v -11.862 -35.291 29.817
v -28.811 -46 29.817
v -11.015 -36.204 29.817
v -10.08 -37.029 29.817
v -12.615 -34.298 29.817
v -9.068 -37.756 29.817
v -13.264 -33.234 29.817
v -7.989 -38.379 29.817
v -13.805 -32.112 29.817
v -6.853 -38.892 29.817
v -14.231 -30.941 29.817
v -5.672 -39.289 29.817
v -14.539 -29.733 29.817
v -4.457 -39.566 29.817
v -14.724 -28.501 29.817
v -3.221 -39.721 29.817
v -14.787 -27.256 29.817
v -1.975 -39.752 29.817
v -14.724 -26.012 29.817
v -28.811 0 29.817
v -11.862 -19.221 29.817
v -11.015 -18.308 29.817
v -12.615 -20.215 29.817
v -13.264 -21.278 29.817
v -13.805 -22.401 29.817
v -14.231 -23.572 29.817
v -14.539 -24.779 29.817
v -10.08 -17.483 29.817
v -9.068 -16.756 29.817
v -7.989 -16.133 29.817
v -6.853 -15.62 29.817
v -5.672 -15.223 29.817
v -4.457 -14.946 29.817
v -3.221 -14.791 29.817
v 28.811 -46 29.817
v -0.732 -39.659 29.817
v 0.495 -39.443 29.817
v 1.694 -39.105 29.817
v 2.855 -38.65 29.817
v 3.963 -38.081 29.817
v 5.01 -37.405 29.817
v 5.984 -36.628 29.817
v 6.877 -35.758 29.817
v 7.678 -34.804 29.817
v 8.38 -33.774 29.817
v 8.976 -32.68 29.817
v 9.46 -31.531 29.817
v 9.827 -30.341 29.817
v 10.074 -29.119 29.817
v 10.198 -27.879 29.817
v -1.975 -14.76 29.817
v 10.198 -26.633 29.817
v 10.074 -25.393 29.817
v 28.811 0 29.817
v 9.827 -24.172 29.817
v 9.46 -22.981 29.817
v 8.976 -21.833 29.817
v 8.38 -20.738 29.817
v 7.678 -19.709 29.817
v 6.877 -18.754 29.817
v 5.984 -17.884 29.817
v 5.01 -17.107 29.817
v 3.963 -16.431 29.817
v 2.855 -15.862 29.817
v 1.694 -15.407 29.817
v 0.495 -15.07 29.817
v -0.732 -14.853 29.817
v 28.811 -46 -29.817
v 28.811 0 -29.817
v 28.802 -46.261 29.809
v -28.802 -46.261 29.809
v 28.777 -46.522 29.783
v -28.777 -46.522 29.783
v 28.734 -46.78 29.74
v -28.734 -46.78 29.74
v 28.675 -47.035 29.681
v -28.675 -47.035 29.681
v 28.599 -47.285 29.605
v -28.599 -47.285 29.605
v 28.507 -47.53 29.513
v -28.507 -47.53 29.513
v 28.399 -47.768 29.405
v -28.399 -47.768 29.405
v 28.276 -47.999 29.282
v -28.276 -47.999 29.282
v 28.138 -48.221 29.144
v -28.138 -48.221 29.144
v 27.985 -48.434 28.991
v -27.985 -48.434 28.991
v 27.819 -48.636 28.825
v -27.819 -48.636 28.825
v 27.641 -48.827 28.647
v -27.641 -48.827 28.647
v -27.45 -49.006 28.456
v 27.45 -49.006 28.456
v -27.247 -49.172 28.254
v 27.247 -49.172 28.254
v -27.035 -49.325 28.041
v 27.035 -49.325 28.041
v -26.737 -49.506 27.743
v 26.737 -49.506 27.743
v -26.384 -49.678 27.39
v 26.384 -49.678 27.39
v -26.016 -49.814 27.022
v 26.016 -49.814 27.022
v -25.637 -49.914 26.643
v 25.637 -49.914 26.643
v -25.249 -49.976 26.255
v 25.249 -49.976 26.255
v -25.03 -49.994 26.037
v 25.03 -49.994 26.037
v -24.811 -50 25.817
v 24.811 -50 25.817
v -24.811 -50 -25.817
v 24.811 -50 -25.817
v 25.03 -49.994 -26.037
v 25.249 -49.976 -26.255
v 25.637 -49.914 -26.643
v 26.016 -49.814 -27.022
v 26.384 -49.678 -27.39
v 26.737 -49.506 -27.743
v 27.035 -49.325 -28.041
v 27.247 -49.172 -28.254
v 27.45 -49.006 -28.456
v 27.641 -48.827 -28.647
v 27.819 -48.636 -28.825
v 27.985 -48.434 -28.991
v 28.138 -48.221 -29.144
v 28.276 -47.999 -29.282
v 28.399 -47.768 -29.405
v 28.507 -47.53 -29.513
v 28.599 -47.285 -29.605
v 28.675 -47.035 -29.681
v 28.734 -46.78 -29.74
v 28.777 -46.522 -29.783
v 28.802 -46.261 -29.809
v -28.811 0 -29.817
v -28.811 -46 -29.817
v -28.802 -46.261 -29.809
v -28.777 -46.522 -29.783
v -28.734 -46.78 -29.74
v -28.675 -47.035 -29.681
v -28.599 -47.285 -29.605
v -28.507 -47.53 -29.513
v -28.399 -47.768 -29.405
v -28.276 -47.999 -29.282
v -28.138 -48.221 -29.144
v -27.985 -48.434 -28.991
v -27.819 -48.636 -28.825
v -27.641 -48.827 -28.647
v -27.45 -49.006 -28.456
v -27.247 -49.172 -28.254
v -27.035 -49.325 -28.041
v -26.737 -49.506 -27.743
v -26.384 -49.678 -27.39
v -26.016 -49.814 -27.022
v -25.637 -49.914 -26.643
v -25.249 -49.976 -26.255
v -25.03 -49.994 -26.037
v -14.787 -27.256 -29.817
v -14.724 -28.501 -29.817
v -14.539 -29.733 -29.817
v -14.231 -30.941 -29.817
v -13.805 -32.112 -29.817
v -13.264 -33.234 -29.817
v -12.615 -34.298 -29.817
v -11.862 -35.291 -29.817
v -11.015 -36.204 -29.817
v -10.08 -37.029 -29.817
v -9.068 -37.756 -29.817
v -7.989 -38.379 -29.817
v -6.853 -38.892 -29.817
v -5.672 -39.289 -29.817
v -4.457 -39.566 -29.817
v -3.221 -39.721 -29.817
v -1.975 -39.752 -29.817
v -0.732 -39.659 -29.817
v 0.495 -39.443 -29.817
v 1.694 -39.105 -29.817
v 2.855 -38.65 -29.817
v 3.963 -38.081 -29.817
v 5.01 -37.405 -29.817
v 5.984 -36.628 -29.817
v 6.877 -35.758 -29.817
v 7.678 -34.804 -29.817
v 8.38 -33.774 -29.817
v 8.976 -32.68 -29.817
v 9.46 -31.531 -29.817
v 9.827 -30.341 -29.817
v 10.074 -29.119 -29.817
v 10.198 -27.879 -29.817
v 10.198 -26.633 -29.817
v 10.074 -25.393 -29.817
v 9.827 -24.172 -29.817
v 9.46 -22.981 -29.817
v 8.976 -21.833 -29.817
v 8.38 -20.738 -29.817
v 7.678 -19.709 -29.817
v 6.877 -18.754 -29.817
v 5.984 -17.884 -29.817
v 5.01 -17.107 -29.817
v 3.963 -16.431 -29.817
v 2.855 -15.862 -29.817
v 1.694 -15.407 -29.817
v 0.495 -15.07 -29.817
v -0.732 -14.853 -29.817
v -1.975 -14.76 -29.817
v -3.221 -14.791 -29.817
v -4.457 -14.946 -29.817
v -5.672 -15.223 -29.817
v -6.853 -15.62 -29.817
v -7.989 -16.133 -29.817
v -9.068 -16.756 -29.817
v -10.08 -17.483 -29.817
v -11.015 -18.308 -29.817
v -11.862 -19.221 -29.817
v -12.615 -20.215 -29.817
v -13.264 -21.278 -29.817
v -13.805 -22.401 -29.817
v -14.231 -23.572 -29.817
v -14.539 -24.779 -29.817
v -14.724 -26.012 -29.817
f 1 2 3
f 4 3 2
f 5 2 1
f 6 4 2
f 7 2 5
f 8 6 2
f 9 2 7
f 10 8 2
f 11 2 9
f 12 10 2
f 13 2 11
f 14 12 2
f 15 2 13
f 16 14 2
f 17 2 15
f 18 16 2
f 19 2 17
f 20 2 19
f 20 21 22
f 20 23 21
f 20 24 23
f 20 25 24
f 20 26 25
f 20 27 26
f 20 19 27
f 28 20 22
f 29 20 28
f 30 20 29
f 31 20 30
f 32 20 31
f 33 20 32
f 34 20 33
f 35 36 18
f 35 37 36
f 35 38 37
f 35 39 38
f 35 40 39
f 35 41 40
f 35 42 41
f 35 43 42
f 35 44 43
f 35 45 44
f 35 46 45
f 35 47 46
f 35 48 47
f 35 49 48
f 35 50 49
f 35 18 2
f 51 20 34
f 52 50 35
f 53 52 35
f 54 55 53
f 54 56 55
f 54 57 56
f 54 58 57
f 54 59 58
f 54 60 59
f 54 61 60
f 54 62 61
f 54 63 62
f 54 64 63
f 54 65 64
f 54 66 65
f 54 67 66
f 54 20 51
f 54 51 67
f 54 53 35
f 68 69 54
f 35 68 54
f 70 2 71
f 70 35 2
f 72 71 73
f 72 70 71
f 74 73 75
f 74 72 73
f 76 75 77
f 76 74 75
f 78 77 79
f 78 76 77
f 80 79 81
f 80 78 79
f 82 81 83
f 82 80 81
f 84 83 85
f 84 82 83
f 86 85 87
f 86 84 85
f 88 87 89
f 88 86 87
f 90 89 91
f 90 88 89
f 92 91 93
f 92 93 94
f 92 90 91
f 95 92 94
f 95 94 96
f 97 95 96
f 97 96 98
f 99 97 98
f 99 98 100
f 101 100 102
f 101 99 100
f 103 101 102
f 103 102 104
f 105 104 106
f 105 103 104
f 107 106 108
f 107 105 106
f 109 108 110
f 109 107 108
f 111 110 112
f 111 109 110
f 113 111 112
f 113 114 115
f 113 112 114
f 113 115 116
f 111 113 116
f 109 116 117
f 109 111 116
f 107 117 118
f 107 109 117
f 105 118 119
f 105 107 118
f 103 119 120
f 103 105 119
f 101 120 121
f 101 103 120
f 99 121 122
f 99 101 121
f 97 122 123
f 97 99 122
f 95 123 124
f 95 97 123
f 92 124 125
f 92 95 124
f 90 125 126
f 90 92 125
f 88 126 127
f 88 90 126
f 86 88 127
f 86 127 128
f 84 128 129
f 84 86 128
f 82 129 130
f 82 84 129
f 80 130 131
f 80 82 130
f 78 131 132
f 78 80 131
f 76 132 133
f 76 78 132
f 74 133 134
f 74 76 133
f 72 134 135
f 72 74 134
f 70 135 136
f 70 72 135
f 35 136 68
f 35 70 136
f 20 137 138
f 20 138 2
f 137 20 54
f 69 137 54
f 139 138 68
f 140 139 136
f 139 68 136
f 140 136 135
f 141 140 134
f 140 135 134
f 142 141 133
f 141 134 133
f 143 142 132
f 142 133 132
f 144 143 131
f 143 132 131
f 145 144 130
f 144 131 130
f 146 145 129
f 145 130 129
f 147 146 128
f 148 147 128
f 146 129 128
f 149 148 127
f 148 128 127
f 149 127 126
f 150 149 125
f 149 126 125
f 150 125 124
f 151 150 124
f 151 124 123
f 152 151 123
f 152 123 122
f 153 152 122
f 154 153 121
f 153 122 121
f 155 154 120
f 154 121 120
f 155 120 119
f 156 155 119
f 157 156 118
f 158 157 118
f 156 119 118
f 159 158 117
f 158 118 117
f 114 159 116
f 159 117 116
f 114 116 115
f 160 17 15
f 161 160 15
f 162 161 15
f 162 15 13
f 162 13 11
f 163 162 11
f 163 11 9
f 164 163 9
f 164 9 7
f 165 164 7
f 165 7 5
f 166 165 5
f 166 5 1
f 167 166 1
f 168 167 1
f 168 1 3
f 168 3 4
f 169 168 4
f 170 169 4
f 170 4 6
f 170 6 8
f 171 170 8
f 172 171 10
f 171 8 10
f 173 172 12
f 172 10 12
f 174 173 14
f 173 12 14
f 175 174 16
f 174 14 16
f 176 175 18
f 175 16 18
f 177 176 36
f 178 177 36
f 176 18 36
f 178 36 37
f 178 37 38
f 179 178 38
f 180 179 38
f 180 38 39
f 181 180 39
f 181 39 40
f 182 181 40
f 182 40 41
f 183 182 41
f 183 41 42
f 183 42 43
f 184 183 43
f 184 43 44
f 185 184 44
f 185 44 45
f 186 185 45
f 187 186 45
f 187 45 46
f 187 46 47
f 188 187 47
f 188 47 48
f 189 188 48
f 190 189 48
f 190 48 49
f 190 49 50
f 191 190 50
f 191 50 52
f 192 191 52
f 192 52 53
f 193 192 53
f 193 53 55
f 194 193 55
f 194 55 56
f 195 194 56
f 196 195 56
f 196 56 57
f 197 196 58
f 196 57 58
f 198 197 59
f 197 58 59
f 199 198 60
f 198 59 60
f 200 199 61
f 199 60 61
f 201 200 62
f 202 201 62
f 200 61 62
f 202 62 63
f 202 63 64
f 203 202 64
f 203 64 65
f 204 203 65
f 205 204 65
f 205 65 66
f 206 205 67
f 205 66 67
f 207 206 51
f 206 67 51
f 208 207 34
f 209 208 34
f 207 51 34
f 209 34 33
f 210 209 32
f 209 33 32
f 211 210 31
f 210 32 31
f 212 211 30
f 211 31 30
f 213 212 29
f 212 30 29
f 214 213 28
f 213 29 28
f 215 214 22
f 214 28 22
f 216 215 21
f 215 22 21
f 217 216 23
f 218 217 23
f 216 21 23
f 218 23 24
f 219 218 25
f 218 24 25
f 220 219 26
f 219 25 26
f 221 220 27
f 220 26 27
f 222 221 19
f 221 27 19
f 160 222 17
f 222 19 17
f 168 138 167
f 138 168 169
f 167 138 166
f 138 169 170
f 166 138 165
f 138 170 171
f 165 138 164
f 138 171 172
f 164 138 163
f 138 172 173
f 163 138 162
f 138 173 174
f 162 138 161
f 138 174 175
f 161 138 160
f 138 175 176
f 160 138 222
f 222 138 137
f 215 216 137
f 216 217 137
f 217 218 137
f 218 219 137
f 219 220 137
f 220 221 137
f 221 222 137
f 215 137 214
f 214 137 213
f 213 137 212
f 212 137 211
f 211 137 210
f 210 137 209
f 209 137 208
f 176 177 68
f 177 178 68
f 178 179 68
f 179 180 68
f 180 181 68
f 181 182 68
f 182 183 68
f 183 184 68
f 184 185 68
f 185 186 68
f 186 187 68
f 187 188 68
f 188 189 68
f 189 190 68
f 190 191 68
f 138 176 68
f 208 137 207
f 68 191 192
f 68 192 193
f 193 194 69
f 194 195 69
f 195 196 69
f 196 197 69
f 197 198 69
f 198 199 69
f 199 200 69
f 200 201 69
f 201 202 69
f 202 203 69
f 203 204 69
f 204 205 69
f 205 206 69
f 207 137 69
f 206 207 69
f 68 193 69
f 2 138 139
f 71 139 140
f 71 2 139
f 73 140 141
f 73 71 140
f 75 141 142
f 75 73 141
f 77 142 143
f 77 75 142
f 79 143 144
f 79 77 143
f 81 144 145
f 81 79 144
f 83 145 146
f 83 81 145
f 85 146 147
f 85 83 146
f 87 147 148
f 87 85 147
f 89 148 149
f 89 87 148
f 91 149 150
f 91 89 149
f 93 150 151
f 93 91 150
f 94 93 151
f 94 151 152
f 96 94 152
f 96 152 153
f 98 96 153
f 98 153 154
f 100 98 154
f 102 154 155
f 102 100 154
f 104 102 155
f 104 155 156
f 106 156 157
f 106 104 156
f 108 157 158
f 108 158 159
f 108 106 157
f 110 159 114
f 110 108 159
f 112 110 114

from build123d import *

# Parameters (mm, degrees)
F0_W     = 57.621952
F0_H     = 59.63415
F1_DEPTH = 50
F3_D     = 25
F4_R     = 4


with BuildPart() as f1:
    # F0 (on Front) → F1 (new body)
    with BuildSketch(Plane.XZ):
        Rectangle(F0_W, F0_H)
    extrude(amount=F1_DEPTH)

    # F3 (through all)
    with Locations(Plane(origin=(0, 0, -29.817075), x_dir=(1, 0, 0), z_dir=(0, 0, -1))):
        with Locations((-2.286586, 27.2561)):
            Hole(F3_D / 2)

    # F4
    f4_edges = [f1.edges().sort_by_distance(p)[0] for p in [
        (0, -50, -29.817075),
        (-28.810976, -50, 0),
        (0, -50, 29.817075),
        (28.810976, -50, 0),
    ]]
    fillet(f4_edges, radius=F4_R)


solid = f1.part
